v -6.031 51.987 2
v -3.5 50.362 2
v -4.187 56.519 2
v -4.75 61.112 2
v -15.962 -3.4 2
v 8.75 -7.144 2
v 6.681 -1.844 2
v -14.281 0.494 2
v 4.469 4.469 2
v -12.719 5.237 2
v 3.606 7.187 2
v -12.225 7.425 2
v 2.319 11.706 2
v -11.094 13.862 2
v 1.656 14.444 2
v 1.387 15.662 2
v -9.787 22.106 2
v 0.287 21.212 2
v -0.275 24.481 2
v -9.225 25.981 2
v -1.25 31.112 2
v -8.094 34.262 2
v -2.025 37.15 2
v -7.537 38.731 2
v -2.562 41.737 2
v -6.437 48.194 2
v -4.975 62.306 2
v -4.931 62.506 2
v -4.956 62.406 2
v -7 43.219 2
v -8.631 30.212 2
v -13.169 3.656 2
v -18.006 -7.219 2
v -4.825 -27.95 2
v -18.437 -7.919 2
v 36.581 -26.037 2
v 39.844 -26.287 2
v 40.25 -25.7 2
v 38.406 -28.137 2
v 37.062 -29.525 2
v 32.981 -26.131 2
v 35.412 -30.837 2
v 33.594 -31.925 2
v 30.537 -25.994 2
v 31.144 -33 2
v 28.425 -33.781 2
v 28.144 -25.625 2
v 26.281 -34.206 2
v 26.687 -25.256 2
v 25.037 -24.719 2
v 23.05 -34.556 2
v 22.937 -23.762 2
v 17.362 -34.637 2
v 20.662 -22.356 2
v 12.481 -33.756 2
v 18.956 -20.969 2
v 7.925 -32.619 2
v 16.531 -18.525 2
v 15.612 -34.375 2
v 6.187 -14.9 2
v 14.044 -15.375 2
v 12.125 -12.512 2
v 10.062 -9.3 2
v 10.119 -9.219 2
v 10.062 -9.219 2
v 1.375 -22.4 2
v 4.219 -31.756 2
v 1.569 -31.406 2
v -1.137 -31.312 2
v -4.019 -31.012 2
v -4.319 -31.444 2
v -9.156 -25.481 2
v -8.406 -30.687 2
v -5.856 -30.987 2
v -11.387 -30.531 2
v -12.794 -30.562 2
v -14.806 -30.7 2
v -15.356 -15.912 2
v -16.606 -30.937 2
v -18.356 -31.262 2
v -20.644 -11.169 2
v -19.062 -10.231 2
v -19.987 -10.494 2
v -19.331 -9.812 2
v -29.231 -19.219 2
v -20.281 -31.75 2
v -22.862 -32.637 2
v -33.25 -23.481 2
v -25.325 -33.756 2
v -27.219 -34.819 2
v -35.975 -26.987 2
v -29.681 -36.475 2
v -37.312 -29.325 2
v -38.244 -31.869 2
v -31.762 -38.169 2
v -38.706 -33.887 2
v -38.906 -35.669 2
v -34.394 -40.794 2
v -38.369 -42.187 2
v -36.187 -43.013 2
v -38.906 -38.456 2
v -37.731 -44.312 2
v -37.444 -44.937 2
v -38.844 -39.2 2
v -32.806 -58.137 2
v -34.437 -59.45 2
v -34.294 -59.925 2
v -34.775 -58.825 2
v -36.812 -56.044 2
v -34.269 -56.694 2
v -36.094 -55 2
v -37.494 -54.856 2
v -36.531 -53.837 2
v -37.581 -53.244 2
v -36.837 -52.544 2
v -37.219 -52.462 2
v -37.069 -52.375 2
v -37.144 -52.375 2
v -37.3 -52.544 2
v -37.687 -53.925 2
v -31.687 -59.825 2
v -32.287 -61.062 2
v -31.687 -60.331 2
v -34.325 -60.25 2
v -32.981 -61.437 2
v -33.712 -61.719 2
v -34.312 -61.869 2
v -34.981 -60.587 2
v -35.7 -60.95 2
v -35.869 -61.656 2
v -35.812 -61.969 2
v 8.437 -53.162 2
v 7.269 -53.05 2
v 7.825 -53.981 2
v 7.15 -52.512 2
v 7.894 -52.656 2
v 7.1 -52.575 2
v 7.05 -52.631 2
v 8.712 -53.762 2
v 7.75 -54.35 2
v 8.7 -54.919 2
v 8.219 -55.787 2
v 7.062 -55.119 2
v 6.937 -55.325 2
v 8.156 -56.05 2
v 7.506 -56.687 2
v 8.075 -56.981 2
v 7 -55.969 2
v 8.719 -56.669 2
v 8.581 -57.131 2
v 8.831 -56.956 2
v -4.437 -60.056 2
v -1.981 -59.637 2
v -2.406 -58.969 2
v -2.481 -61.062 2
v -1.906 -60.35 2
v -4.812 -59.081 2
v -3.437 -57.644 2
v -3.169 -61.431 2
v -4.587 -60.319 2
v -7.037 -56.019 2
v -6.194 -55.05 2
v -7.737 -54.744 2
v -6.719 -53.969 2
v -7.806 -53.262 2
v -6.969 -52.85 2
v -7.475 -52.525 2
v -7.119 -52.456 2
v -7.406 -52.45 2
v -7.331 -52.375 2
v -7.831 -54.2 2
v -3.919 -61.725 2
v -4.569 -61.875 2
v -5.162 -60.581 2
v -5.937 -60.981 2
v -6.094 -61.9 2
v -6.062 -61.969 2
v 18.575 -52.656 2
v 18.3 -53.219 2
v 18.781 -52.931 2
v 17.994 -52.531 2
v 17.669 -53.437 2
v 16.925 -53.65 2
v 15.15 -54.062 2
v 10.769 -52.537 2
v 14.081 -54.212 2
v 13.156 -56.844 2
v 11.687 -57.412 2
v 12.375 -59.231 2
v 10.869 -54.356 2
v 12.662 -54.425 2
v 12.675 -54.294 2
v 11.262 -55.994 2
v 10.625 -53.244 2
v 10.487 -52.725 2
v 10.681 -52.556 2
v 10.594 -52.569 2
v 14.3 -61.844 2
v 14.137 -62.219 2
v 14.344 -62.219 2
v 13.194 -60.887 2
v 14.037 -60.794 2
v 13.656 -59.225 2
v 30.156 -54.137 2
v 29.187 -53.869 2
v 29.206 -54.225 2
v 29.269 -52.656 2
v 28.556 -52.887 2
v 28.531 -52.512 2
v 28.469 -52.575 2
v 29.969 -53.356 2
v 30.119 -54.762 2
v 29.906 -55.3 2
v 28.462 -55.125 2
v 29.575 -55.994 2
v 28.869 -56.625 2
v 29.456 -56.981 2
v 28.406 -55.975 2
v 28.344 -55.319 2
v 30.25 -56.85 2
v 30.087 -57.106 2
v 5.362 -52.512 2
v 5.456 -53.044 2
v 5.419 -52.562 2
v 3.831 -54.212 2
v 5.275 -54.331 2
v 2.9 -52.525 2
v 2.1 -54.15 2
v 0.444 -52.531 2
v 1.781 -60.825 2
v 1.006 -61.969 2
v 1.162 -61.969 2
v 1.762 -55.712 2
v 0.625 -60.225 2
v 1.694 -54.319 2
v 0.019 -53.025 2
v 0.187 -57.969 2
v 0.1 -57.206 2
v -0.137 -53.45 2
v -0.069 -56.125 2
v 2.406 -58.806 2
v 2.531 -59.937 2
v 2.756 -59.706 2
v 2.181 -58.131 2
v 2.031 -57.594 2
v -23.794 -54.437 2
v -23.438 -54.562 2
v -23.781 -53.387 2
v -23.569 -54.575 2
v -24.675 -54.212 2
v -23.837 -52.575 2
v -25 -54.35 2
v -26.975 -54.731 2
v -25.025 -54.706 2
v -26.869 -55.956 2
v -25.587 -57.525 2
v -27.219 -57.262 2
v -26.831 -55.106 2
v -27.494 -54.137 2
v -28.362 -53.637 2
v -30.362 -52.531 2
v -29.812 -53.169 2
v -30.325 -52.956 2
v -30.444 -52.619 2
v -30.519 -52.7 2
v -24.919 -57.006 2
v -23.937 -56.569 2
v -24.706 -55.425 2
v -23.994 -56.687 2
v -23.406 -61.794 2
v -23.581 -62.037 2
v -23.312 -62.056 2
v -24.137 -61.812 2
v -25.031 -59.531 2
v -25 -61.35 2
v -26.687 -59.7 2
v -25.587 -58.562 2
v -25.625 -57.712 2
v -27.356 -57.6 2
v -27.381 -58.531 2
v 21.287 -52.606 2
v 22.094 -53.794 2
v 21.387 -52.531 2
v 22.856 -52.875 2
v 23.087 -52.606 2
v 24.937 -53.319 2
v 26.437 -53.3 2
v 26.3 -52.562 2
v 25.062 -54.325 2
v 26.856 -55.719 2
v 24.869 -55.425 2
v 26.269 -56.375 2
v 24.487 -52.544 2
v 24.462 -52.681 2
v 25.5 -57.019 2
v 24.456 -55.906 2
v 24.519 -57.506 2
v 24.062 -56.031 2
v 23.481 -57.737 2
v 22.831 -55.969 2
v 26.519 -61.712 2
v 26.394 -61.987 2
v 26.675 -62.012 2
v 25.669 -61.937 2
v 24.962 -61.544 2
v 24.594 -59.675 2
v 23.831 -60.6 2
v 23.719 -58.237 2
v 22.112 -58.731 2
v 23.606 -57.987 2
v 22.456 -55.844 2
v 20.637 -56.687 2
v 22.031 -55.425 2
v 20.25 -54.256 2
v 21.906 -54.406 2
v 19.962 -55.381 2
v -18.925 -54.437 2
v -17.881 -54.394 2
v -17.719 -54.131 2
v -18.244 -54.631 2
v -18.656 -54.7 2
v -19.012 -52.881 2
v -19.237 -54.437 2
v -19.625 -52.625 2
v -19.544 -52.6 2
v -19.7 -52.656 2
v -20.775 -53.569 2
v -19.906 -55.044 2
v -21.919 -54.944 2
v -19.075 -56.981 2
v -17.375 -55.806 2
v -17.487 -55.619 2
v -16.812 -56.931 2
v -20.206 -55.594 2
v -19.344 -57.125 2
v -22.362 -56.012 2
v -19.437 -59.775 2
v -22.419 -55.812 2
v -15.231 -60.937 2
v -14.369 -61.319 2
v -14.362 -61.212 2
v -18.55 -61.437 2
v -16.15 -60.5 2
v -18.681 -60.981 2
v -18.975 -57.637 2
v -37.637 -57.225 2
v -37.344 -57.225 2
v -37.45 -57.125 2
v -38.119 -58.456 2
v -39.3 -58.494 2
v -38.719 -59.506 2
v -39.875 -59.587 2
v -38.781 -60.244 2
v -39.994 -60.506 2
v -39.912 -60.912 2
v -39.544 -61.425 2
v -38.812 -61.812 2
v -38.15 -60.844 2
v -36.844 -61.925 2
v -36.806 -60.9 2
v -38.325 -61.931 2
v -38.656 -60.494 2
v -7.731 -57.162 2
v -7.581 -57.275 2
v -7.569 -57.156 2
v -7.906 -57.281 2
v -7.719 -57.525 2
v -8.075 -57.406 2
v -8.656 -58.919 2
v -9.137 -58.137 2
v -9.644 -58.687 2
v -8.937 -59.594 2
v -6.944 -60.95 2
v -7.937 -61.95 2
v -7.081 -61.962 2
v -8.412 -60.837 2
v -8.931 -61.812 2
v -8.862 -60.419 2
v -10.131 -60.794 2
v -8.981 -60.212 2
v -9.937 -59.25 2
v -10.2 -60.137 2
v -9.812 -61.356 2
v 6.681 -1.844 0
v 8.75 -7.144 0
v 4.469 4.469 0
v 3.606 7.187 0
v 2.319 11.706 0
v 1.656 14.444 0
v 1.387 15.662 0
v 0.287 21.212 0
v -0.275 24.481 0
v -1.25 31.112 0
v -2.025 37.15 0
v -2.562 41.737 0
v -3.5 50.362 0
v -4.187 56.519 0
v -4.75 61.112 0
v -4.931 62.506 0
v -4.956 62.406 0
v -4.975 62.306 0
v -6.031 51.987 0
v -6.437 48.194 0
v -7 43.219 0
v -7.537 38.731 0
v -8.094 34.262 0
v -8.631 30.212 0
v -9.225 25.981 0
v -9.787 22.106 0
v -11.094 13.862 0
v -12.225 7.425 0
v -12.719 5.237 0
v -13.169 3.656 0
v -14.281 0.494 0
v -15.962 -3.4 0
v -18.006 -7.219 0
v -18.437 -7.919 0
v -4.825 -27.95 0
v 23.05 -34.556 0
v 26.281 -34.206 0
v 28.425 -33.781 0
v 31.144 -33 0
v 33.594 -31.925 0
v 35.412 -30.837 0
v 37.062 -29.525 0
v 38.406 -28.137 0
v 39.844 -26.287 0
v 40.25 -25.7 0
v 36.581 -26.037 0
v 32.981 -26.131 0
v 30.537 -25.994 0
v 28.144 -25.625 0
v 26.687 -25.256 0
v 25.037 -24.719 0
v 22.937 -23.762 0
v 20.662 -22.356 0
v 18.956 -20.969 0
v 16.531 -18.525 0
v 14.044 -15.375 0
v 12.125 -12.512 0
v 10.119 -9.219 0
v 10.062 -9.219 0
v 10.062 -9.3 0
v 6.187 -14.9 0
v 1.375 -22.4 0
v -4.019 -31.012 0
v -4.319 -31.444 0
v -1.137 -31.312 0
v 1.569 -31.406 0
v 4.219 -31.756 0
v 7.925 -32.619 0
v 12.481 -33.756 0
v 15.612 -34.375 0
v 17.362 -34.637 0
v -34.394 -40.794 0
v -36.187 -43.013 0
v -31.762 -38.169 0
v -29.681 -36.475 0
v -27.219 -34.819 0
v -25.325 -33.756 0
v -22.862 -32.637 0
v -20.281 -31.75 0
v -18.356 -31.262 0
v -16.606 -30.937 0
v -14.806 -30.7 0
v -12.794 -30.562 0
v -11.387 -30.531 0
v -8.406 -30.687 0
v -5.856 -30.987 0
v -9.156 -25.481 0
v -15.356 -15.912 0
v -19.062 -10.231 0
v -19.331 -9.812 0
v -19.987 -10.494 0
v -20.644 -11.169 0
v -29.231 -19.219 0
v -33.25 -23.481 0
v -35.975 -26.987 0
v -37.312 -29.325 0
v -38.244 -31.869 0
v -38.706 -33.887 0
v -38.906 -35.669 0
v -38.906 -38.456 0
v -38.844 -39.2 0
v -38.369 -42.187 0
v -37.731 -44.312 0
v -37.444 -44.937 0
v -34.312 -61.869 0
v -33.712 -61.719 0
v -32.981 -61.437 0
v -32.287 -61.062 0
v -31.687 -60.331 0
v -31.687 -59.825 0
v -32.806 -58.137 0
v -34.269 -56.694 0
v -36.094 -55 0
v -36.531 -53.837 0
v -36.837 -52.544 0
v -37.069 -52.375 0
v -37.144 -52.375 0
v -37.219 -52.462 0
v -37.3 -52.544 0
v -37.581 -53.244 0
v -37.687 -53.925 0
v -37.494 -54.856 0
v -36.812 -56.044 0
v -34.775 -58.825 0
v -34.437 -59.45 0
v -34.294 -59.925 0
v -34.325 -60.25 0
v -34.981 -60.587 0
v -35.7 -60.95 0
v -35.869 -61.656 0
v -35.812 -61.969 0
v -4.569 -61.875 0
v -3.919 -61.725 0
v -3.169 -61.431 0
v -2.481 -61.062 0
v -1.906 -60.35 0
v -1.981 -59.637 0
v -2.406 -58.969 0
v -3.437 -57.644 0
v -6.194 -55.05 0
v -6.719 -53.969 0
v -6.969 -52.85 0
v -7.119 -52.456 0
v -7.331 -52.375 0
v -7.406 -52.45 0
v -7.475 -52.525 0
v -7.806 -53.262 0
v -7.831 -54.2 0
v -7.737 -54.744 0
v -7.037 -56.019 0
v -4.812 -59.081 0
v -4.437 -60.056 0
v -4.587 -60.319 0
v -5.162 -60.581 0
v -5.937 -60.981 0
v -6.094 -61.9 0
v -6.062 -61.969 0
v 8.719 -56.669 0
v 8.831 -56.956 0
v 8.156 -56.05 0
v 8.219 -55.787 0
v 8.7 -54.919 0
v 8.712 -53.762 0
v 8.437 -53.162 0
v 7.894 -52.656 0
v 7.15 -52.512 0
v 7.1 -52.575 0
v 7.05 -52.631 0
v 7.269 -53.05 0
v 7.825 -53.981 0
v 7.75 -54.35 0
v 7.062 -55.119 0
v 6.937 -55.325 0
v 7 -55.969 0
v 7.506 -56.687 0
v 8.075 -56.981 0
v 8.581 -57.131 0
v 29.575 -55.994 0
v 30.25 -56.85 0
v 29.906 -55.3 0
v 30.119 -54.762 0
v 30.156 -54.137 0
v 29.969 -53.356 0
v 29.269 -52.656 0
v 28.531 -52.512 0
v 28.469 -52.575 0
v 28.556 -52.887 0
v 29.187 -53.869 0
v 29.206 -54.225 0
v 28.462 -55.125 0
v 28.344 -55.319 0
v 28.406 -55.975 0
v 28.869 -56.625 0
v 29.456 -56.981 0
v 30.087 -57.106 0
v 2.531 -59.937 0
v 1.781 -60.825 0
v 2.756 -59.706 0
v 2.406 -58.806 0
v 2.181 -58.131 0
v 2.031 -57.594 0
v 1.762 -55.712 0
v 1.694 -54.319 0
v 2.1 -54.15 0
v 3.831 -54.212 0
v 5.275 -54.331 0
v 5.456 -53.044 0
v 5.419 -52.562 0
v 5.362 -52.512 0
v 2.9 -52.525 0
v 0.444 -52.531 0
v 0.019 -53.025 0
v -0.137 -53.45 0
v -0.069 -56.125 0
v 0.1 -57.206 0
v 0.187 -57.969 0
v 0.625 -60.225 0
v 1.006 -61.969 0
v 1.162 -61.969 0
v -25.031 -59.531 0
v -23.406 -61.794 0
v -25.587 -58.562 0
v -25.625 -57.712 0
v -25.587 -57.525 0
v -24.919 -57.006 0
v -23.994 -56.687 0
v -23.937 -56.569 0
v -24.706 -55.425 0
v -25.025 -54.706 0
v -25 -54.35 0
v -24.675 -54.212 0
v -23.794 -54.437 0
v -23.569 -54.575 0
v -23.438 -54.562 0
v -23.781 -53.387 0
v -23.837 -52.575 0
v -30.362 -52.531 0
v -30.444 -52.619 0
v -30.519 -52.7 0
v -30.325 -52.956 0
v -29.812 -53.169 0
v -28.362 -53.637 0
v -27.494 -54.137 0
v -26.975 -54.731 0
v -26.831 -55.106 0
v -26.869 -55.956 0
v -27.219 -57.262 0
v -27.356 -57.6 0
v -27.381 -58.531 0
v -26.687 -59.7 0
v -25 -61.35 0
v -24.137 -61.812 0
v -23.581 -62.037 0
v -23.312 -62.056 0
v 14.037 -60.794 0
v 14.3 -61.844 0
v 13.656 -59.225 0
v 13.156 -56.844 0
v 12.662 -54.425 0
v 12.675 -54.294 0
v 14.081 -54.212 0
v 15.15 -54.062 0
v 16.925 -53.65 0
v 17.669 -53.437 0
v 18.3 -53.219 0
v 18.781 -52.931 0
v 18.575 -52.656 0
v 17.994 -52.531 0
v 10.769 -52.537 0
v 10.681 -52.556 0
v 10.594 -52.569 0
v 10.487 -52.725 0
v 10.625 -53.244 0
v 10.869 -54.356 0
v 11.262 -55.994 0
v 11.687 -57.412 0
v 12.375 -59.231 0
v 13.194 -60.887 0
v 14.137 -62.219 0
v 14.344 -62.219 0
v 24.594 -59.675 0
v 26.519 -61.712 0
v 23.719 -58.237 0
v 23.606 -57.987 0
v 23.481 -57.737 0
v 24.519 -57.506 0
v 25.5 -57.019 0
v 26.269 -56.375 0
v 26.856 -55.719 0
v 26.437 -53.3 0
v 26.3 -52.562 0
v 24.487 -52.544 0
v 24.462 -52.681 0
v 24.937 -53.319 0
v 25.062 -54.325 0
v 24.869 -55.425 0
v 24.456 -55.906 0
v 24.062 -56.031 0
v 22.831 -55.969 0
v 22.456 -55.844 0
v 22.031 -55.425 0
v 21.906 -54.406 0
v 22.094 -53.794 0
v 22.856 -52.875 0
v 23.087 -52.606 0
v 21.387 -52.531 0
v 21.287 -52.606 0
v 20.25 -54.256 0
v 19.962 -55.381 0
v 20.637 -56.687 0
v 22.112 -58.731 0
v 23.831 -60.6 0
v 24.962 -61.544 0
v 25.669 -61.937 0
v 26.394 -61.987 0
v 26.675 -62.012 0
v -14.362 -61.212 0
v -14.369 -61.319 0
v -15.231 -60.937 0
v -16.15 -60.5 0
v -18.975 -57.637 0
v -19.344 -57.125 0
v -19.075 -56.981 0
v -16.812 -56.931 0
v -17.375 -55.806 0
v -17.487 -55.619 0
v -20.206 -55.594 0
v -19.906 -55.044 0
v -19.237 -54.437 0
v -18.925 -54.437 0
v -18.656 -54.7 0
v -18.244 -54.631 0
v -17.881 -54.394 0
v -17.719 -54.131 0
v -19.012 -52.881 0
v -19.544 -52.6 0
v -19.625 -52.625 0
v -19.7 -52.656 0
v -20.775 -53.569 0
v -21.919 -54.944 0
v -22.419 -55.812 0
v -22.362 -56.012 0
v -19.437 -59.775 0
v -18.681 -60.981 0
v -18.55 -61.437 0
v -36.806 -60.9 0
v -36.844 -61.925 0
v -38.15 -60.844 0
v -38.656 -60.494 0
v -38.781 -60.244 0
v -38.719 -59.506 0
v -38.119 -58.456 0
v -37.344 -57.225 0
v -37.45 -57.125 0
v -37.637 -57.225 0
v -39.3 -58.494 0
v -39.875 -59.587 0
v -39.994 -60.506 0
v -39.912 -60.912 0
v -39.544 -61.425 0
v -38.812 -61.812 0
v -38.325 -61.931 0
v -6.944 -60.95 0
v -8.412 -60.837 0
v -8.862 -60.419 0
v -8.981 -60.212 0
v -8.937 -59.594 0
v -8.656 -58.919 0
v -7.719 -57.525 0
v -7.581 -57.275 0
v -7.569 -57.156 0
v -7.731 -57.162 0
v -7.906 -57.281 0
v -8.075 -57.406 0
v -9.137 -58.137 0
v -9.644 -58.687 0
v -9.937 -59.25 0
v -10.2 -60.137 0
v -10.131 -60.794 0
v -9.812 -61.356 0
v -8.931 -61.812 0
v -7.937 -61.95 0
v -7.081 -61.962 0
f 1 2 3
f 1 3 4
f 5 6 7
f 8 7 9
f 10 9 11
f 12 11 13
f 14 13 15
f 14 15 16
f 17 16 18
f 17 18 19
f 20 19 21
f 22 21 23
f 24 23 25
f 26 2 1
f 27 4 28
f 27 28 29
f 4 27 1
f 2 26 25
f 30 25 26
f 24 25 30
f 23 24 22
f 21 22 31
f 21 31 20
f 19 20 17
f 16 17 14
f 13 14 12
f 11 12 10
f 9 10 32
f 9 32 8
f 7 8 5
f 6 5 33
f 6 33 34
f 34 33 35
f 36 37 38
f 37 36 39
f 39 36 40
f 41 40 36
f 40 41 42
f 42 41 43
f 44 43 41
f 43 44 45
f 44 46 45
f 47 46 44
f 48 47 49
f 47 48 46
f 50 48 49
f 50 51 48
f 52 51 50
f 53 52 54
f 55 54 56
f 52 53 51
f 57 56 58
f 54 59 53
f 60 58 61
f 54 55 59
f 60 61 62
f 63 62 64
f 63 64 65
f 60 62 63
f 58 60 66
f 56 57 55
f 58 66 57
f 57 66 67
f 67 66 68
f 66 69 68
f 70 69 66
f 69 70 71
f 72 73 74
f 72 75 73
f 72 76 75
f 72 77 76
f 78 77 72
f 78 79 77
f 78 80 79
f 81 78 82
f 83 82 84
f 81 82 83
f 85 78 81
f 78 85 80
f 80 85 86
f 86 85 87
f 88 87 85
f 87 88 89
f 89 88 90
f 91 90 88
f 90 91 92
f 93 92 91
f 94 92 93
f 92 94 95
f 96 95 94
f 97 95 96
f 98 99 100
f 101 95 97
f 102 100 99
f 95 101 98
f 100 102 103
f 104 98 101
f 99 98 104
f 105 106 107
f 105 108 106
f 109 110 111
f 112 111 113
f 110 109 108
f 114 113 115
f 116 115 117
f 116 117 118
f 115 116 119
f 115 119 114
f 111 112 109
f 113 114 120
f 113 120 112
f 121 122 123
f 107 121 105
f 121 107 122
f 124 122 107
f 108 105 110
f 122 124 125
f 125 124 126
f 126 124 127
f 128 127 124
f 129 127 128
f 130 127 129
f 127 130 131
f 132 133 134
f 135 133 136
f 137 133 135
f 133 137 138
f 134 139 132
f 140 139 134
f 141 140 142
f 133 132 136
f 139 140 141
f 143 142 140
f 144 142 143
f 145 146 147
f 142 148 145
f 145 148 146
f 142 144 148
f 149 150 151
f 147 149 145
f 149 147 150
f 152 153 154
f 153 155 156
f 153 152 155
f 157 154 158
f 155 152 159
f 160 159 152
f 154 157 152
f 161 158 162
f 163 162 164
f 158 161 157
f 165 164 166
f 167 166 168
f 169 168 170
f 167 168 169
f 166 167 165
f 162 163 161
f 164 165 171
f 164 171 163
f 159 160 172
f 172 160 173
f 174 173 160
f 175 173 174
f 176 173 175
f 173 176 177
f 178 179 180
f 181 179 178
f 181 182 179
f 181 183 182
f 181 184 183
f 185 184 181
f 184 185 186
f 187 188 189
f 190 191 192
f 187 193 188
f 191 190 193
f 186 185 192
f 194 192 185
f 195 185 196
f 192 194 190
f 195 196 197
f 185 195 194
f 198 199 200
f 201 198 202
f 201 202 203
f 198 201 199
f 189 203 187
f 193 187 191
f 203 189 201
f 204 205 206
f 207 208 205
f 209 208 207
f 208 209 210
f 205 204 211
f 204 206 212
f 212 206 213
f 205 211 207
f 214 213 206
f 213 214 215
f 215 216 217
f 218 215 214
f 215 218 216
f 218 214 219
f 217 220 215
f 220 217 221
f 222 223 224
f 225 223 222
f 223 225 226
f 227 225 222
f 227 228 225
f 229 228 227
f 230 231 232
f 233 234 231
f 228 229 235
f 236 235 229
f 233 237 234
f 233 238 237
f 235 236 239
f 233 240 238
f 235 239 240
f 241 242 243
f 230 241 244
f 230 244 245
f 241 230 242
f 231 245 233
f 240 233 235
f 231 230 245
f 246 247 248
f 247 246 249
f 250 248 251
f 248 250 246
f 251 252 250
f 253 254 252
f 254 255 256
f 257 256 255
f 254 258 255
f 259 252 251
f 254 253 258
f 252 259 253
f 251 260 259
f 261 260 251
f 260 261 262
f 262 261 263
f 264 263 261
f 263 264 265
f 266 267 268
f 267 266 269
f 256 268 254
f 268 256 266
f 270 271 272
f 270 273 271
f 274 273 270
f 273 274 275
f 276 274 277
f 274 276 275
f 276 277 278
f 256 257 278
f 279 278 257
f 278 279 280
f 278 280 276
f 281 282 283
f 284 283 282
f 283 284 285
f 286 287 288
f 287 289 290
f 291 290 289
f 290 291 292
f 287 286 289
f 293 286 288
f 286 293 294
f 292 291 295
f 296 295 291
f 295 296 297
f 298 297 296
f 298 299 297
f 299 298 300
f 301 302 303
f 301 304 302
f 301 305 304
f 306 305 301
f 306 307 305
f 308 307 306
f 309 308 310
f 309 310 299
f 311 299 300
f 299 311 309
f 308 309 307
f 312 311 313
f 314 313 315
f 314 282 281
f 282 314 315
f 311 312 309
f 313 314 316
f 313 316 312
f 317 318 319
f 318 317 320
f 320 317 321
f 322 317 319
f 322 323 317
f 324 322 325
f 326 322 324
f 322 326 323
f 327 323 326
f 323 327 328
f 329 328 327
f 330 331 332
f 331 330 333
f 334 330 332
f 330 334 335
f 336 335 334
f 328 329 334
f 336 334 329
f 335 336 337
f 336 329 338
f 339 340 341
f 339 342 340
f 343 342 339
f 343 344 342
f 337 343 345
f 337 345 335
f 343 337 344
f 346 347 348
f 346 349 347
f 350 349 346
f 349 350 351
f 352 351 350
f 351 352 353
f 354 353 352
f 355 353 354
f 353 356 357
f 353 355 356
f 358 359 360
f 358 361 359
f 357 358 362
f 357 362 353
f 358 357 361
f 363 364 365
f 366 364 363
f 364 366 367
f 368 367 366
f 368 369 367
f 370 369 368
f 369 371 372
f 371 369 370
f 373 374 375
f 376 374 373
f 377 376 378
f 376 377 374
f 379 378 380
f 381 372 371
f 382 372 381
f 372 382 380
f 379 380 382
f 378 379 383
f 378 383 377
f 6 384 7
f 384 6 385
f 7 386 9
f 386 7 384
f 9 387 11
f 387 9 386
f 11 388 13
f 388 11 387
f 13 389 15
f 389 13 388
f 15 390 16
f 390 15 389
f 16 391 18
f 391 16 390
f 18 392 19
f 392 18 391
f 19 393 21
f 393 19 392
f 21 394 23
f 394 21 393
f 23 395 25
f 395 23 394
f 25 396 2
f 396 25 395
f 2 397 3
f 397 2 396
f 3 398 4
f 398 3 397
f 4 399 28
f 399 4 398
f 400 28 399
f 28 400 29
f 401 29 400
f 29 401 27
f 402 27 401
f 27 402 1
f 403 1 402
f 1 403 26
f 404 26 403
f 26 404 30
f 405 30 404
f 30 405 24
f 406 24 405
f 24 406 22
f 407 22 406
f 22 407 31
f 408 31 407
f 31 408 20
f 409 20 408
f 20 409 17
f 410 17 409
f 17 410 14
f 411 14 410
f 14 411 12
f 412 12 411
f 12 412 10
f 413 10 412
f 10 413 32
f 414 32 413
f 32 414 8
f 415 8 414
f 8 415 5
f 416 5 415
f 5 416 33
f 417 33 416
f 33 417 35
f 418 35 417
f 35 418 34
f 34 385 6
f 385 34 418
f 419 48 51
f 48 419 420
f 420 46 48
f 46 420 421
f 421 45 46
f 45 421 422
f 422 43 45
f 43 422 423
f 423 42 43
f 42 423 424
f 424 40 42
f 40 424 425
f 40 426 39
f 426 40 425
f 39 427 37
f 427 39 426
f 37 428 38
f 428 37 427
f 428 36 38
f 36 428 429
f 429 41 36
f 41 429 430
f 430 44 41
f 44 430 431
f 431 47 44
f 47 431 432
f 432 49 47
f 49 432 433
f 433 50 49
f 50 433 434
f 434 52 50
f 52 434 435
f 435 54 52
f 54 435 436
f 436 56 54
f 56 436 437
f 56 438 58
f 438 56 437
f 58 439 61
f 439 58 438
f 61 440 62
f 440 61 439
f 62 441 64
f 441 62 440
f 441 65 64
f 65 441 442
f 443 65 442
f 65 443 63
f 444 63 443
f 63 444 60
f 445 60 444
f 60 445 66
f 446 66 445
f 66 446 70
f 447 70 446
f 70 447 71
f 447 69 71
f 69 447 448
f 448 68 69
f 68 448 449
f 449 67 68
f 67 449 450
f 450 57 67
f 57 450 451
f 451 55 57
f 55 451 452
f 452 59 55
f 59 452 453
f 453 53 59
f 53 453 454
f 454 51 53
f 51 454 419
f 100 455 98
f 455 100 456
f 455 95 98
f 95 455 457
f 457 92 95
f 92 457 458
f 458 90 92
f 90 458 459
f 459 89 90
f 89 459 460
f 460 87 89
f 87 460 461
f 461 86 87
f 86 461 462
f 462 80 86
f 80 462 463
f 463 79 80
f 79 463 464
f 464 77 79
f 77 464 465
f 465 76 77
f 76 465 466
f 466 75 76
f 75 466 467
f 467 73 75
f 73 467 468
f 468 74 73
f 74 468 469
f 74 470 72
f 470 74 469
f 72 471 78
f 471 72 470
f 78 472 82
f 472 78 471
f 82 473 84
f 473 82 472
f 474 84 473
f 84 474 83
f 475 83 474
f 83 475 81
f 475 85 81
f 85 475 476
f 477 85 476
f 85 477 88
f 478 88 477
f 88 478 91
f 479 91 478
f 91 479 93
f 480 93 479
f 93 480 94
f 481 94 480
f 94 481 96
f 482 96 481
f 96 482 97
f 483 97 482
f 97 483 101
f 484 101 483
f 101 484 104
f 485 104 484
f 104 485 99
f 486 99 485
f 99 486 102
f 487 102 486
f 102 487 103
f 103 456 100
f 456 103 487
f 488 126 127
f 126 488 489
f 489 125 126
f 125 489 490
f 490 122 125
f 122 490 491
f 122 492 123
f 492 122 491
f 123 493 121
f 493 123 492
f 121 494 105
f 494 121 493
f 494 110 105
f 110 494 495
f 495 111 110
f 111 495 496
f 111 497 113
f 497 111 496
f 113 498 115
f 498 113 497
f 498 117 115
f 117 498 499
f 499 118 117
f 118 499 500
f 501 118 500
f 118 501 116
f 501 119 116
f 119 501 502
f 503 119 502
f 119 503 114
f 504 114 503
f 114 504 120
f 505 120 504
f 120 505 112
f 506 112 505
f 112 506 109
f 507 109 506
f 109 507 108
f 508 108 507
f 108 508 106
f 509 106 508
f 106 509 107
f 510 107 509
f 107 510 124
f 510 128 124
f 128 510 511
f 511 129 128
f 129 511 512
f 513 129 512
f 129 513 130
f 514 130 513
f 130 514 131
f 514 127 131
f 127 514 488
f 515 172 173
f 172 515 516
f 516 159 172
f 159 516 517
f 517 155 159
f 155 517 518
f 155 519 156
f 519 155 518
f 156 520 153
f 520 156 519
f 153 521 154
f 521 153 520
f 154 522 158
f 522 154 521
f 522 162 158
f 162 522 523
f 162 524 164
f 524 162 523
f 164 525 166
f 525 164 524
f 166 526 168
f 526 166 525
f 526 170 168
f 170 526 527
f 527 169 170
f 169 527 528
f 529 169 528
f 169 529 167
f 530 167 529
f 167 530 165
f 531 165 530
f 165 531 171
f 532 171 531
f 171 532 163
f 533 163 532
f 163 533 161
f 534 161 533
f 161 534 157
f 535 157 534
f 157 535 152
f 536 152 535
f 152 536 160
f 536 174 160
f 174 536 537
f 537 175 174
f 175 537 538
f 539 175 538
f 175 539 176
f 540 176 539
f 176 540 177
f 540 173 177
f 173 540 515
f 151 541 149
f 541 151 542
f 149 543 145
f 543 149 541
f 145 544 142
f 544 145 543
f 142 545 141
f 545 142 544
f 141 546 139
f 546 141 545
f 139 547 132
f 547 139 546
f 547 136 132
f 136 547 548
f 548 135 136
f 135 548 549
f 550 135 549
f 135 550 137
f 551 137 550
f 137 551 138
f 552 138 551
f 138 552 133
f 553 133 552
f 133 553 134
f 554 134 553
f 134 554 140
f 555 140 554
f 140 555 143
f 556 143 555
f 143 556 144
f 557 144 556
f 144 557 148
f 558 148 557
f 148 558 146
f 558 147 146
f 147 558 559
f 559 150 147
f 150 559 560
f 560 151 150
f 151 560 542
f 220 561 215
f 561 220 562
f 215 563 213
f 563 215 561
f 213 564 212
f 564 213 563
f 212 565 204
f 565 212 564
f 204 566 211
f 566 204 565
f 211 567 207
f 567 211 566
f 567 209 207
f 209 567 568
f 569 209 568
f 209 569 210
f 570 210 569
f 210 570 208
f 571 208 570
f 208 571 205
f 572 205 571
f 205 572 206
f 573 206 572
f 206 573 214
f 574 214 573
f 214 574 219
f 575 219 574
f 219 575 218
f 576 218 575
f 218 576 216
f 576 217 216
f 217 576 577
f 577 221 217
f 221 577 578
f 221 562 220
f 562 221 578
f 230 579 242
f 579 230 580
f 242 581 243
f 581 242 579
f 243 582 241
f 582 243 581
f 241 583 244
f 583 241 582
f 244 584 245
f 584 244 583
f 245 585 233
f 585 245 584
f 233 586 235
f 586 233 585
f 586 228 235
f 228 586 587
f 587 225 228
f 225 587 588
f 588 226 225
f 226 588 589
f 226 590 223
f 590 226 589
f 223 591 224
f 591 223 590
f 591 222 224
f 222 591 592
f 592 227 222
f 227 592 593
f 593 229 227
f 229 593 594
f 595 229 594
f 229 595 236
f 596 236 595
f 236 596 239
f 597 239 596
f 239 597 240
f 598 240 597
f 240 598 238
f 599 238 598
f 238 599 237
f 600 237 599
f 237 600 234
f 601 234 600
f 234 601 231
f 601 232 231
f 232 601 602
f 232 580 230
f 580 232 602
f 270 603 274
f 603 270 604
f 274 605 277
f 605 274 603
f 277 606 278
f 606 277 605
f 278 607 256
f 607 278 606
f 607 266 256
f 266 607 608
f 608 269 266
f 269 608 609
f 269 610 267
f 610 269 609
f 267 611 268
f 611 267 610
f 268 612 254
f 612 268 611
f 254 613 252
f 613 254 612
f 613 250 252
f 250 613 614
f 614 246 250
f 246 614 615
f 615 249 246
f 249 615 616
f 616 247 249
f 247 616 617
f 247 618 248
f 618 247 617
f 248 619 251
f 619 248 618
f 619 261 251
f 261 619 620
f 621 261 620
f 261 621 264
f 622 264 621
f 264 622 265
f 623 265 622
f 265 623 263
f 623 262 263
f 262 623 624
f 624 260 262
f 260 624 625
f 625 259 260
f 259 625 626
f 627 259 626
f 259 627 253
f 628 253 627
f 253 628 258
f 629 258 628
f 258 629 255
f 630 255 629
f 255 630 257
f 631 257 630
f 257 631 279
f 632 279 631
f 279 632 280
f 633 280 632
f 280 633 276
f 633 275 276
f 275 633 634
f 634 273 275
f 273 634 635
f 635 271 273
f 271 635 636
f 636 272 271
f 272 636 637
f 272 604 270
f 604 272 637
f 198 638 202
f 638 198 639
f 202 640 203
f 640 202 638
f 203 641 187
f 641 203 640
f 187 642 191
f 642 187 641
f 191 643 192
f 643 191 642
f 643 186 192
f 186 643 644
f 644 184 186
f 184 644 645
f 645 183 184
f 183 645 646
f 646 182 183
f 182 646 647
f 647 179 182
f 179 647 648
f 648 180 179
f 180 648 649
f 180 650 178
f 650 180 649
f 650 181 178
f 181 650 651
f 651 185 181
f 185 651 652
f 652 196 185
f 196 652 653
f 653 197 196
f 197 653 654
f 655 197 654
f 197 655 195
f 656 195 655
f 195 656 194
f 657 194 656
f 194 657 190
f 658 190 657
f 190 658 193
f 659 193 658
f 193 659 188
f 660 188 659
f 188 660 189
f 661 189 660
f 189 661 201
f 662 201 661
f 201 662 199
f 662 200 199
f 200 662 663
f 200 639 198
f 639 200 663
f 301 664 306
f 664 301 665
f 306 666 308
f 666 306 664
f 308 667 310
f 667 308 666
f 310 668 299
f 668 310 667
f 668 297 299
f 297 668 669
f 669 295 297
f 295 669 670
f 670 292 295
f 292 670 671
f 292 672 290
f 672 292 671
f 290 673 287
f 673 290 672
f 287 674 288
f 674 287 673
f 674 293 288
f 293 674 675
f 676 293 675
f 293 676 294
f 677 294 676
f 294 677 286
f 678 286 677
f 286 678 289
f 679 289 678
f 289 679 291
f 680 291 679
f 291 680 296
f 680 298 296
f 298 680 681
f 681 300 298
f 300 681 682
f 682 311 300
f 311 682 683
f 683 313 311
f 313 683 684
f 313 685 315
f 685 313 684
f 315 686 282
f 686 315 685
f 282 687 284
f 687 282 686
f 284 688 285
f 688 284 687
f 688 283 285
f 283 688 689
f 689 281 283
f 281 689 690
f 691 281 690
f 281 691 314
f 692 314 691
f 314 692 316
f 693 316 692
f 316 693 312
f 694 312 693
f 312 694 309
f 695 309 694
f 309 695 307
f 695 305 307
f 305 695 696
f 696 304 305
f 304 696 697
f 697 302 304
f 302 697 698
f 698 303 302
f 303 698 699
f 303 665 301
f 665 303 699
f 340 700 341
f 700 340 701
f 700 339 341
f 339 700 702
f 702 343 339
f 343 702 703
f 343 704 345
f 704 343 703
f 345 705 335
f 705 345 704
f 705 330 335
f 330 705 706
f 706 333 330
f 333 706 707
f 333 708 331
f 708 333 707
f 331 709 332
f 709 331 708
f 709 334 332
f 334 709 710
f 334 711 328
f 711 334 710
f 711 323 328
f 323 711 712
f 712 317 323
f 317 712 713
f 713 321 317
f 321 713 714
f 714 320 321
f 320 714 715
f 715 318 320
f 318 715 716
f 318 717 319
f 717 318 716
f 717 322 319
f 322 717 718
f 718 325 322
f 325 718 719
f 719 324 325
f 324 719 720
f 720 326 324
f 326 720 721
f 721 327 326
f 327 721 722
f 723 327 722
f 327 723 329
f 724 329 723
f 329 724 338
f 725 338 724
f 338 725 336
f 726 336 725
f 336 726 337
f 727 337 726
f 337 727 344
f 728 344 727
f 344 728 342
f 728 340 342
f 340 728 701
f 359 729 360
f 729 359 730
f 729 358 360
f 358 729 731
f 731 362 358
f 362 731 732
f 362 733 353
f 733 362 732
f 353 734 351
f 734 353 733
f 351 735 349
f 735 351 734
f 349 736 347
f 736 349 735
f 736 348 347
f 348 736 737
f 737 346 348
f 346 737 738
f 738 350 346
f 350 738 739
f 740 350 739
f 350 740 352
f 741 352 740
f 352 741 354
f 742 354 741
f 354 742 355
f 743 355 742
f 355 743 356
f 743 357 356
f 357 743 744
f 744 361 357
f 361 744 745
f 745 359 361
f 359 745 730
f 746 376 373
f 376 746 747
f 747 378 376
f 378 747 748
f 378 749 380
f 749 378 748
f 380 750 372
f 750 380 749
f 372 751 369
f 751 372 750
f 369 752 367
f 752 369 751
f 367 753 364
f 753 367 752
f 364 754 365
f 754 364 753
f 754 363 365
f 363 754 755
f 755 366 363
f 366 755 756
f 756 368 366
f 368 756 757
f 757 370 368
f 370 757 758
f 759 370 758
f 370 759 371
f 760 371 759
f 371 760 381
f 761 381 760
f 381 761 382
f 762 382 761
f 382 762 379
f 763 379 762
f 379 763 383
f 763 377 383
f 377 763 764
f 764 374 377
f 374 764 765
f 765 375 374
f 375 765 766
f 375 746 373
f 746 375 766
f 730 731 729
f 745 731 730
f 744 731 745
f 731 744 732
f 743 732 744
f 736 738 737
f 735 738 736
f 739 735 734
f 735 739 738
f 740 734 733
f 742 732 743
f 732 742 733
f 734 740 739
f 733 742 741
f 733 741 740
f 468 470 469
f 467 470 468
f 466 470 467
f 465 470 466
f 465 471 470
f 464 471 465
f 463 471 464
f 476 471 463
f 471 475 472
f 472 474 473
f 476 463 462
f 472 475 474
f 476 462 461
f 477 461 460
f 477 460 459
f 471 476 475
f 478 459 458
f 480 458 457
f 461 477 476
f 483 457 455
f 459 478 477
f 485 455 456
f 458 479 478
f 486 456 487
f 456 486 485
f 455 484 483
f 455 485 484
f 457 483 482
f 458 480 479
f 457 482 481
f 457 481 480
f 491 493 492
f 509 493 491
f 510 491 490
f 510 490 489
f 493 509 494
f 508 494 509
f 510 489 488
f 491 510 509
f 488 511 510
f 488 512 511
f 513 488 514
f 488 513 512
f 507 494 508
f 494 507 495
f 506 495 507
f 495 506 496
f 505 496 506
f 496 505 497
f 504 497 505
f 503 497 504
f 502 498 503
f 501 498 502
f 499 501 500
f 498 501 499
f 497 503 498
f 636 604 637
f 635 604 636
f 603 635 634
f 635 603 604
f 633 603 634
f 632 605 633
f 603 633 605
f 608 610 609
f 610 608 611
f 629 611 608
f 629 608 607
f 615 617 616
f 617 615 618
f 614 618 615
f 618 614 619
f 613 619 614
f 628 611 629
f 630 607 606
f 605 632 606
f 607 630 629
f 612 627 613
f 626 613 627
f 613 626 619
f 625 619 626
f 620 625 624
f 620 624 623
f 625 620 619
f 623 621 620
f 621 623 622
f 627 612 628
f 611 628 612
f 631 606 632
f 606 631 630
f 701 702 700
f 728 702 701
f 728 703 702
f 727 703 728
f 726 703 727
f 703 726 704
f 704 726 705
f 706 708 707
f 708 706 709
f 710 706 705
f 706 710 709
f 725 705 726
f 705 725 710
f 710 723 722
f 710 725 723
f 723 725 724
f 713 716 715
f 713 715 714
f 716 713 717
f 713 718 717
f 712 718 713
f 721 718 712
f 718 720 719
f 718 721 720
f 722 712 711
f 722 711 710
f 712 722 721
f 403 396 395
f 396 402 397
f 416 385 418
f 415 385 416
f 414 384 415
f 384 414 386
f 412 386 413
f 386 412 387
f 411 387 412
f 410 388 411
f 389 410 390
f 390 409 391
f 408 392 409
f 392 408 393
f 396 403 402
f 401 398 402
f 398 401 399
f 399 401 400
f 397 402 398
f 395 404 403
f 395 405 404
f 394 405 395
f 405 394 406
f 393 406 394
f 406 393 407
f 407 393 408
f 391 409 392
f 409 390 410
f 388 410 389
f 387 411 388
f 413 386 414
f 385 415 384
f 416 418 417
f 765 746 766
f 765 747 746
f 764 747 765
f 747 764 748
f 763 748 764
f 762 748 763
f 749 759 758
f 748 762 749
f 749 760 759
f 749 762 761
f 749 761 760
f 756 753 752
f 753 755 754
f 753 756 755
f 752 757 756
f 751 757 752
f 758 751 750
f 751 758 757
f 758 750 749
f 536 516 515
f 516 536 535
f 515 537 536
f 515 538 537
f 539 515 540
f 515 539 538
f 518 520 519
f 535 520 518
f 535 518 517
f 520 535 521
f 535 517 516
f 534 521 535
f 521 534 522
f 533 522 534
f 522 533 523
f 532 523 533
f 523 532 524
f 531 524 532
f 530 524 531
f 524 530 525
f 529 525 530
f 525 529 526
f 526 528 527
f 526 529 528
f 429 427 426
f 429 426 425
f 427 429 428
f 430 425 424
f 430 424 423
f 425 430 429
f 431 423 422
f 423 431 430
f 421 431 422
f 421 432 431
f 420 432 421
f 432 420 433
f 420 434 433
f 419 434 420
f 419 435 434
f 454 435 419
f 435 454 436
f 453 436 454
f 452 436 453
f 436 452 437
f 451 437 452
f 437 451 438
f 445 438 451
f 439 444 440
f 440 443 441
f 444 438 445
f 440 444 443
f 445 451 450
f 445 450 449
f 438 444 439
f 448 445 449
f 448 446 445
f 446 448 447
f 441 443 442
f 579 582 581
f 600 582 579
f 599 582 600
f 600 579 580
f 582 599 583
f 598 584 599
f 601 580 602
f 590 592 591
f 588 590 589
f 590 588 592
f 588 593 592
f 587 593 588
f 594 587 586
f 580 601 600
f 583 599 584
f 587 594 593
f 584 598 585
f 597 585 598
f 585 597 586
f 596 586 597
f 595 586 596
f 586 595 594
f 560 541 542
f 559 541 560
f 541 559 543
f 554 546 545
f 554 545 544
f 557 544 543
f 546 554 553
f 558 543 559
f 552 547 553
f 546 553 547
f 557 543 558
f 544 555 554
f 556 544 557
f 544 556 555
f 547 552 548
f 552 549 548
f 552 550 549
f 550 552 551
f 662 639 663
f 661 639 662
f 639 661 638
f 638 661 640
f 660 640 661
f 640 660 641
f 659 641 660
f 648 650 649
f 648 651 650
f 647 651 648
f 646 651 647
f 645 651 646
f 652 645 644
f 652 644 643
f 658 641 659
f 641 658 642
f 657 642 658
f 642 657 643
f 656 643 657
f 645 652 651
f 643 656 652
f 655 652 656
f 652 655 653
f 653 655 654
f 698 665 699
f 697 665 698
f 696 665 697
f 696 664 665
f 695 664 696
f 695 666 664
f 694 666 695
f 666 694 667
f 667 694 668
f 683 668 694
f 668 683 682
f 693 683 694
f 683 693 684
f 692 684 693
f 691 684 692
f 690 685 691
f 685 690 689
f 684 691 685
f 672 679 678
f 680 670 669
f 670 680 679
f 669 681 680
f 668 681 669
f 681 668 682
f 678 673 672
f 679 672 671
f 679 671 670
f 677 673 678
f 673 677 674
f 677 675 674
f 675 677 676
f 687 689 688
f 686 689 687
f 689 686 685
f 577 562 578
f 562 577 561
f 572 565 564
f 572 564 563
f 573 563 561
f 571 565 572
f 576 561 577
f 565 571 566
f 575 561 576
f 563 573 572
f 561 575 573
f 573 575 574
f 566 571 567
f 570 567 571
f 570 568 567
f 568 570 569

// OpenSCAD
module a7641cfd47d2ef1650ae20828b2a6e28_1()
{
 /* Generated by trace2scad version 20150415
    http://aggregate.org/MAKE/TRACE2SCAD/
    Optimized model has 387/4796 original points
 */
 color([0.48, 0.48, 0.48])
 assign(minx=0) /* polygon minx=39 */
 assign(miny=0) /* polygon miny=45 */
 assign(maxx=12880) /* polygon maxx=12880 */
 assign(maxy=20000) /* polygon maxy=20001 */
 assign(dx=maxx-minx)
 assign(dy=maxy-miny)
 assign(maxd=((dx>dy)?dx:dy))
 scale([1/maxd, 1/maxd, 1])
 translate([-minx-dx/2, -miny-dy/2, 0])
 linear_extrude(height=1, convexity=387)
 union() {
  union() {
   polygon([[5647,19985],[5644,19969],[5475,18318],[5410,17711],[5320,16915],[5234,16197],[5145,15482],[5059,14834],[4964,14157],[4874,13537],[4665,12218],[4484,11188],[4405,10838],[4333,10585],[4155,10079],[3886,9456],[3559,8845],[3490,8733],[5668,5528],[7840,8857],[7509,9705],[7155,10715],[7017,11150],[6811,11873],[6705,12311],[6662,12506],[6486,13394],[6396,13917],[6240,14978],[6116,15944],[6030,16678],[5880,18058],[5770,19043],[5680,19778],[5651,20001]], convexity=6);
   polygon([[8050,8518],[8050,8512],[7430,7616],[6660,6416],[5797,5038],[5749,4969],[6258,4990],[6691,4975],[7115,4919],[7708,4781],[8437,4599],[8938,4500],[9218,4458],[10128,4471],[10645,4527],[10988,4595],[11423,4720],[11815,4892],[12106,5066],[12370,5276],[12585,5498],[12815,5794],[12880,5888],[12293,5834],[11717,5819],[11326,5841],[10943,5900],[10710,5959],[10446,6045],[10110,6198],[9746,6423],[9473,6645],[9085,7036],[8687,7540],[8380,7998],[8059,8525],[8050,8525]], convexity=9);
   polygon([[3242,8321],[3137,8213],[1763,6925],[1120,6243],[684,5682],[470,5308],[321,4901],[247,4578],[215,4293],[215,3847],[225,3728],[301,3250],[403,2910],[449,2810],[650,3118],[937,3473],[1358,3893],[1691,4164],[2085,4429],[2388,4599],[2782,4778],[3195,4920],[3503,4998],[3783,5050],[4071,5088],[4393,5110],[4618,5115],[5095,5090],[5503,5042],[4975,5923],[3983,7454],[3390,8363],[3347,8430]], convexity=7);
   polygon([[485,1606],[472,1593],[427,1481],[410,1372],[441,1223],[550,1033],[876,588],[930,488],[953,412],[948,360],[843,306],[728,248],[701,135],[710,85],[950,101],[1046,125],[1163,170],[1274,230],[1370,347],[1370,428],[1191,698],[957,929],[665,1200],[595,1386],[546,1593],[509,1620],[497,1620]], convexity=8);
   polygon([[5255,1608],[5244,1596],[5191,1478],[5187,1328],[5202,1241],[5314,1037],[5670,547],[5730,391],[5706,349],[5614,307],[5490,243],[5465,96],[5470,85],[5709,100],[5813,124],[5933,171],[6043,230],[6135,344],[6123,458],[6055,565],[5890,777],[5449,1192],[5365,1365],[5325,1544],[5301,1607],[5267,1620]], convexity=8);
   polygon([[6904,1596],[6511,1595],[6443,1516],[6418,1448],[6429,1020],[6456,847],[6470,725],[6540,364],[6601,85],[6626,85],[6725,268],[6845,410],[6881,447],[6825,591],[6789,699],[6765,785],[6722,1086],[6711,1309],[6776,1336],[7053,1326],[7284,1307],[7313,1513],[7307,1590],[7298,1598]], convexity=10);
   polygon([[7576,1588],[7568,1579],[7603,1512],[7692,1363],[7680,1304],[7570,1181],[7550,1148],[7560,1045],[7641,930],[7732,883],[7813,859],[7853,887],[7835,933],[7745,1032],[7755,1074],[7832,1213],[7834,1398],[7790,1494],[7703,1575],[7584,1598]], convexity=10);
   polygon([[11000,1593],[10995,1588],[11009,1538],[11110,1381],[11113,1324],[10994,1180],[10975,1149],[10985,1044],[11059,940],[11153,883],[11254,863],[11280,904],[11172,1041],[11225,1152],[11259,1238],[11265,1338],[11235,1463],[11123,1575],[11005,1598]], convexity=10);
   polygon([[1569,1581],[1557,1568],[1588,1527],[1670,1493],[1902,1418],[2041,1338],[2124,1243],[2147,1183],[2141,1047],[2085,838],[2063,784],[2059,635],[2170,448],[2440,184],[2578,110],[2667,74],[2710,71],[2695,113],[2435,475],[2346,630],[2340,766],[2346,796],[2453,879],[2601,930],[2610,949],[2487,1132],[2436,1247],[2440,1304],[2492,1326],[2633,1290],[2669,1268],[2690,1270],[2635,1458],[2626,1588],[1582,1595]], convexity=13);
   polygon([[8149,1591],[8135,1589],[8118,1564],[8140,1481],[8179,1303],[8242,1041],[8310,814],[8420,523],[8551,258],[8702,45],[8735,45],[8728,105],[8686,273],[8625,524],[8545,905],[8466,1292],[8468,1313],[8693,1326],[8864,1350],[9148,1416],[9267,1450],[9368,1485],[9445,1531],[9412,1575],[9319,1595],[8163,1594]], convexity=9);
   polygon([[9854,1589],[9846,1583],[9680,1319],[9634,1139],[9742,930],[9978,603],[10253,304],[10434,153],[10547,90],[10663,82],[10708,78],[10683,126],[10375,452],[10235,682],[10217,722],[10197,762],[10363,799],[10520,877],[10643,980],[10737,1085],[10670,1472],[10648,1590],[10358,1593],[10354,1571],[10430,1469],[10450,1308],[10419,1132],[10353,1055],[10290,1035],[10093,1045],[10033,1065],[9965,1132],[9945,1295],[9975,1393],[10097,1540],[10134,1583],[9862,1595]], convexity=13);
   polygon([[3300,1580],[3288,1575],[3116,1429],[2933,1209],[2853,1070],[2862,1038],[3330,436],[3451,243],[3472,170],[4141,189],[4142,206],[4003,250],[3856,320],[3404,778],[3345,860],[3388,883],[3750,891],[3660,1071],[3642,1101],[3207,1105],[3255,1193],[3362,1290],[3412,1290],[3455,1248],[3521,1259],[3579,1297],[3605,1339],[3398,1539],[3313,1584]], convexity=12);
   polygon([[433,852],[418,844],[152,641],[60,466],[41,319],[54,254],[113,172],[230,110],[308,91],[545,92],[551,256],[336,265],[255,321],[235,361],[245,479],[341,647],[465,844],[448,860]], convexity=8);
   polygon([[5175,835],[5148,815],[4978,698],[4897,610],[4850,520],[4808,378],[4819,273],[4870,183],[5011,110],[5170,88],[5307,86],[5329,248],[5094,266],[5022,333],[5003,366],[5010,465],[5055,573],[5205,796],[5227,836],[5229,855],[5203,854]], convexity=8);
  }
 }
}

module a7641cfd47d2ef1650ae20828b2a6e28()
{
 /* all layers combined, scaled to within a 1mm cube */
 scale([1, 1, 1/1])
 difference() {
  union() {
   scale([1,1,2]) translate([0,0,-0.5]) a7641cfd47d2ef1650ae20828b2a6e28_1();
  }
  translate([0,0,-2]) cube([2,2,4],center=true);
 }
}

scale([125, 125, 2]) {
	a7641cfd47d2ef1650ae20828b2a6e28();
}
